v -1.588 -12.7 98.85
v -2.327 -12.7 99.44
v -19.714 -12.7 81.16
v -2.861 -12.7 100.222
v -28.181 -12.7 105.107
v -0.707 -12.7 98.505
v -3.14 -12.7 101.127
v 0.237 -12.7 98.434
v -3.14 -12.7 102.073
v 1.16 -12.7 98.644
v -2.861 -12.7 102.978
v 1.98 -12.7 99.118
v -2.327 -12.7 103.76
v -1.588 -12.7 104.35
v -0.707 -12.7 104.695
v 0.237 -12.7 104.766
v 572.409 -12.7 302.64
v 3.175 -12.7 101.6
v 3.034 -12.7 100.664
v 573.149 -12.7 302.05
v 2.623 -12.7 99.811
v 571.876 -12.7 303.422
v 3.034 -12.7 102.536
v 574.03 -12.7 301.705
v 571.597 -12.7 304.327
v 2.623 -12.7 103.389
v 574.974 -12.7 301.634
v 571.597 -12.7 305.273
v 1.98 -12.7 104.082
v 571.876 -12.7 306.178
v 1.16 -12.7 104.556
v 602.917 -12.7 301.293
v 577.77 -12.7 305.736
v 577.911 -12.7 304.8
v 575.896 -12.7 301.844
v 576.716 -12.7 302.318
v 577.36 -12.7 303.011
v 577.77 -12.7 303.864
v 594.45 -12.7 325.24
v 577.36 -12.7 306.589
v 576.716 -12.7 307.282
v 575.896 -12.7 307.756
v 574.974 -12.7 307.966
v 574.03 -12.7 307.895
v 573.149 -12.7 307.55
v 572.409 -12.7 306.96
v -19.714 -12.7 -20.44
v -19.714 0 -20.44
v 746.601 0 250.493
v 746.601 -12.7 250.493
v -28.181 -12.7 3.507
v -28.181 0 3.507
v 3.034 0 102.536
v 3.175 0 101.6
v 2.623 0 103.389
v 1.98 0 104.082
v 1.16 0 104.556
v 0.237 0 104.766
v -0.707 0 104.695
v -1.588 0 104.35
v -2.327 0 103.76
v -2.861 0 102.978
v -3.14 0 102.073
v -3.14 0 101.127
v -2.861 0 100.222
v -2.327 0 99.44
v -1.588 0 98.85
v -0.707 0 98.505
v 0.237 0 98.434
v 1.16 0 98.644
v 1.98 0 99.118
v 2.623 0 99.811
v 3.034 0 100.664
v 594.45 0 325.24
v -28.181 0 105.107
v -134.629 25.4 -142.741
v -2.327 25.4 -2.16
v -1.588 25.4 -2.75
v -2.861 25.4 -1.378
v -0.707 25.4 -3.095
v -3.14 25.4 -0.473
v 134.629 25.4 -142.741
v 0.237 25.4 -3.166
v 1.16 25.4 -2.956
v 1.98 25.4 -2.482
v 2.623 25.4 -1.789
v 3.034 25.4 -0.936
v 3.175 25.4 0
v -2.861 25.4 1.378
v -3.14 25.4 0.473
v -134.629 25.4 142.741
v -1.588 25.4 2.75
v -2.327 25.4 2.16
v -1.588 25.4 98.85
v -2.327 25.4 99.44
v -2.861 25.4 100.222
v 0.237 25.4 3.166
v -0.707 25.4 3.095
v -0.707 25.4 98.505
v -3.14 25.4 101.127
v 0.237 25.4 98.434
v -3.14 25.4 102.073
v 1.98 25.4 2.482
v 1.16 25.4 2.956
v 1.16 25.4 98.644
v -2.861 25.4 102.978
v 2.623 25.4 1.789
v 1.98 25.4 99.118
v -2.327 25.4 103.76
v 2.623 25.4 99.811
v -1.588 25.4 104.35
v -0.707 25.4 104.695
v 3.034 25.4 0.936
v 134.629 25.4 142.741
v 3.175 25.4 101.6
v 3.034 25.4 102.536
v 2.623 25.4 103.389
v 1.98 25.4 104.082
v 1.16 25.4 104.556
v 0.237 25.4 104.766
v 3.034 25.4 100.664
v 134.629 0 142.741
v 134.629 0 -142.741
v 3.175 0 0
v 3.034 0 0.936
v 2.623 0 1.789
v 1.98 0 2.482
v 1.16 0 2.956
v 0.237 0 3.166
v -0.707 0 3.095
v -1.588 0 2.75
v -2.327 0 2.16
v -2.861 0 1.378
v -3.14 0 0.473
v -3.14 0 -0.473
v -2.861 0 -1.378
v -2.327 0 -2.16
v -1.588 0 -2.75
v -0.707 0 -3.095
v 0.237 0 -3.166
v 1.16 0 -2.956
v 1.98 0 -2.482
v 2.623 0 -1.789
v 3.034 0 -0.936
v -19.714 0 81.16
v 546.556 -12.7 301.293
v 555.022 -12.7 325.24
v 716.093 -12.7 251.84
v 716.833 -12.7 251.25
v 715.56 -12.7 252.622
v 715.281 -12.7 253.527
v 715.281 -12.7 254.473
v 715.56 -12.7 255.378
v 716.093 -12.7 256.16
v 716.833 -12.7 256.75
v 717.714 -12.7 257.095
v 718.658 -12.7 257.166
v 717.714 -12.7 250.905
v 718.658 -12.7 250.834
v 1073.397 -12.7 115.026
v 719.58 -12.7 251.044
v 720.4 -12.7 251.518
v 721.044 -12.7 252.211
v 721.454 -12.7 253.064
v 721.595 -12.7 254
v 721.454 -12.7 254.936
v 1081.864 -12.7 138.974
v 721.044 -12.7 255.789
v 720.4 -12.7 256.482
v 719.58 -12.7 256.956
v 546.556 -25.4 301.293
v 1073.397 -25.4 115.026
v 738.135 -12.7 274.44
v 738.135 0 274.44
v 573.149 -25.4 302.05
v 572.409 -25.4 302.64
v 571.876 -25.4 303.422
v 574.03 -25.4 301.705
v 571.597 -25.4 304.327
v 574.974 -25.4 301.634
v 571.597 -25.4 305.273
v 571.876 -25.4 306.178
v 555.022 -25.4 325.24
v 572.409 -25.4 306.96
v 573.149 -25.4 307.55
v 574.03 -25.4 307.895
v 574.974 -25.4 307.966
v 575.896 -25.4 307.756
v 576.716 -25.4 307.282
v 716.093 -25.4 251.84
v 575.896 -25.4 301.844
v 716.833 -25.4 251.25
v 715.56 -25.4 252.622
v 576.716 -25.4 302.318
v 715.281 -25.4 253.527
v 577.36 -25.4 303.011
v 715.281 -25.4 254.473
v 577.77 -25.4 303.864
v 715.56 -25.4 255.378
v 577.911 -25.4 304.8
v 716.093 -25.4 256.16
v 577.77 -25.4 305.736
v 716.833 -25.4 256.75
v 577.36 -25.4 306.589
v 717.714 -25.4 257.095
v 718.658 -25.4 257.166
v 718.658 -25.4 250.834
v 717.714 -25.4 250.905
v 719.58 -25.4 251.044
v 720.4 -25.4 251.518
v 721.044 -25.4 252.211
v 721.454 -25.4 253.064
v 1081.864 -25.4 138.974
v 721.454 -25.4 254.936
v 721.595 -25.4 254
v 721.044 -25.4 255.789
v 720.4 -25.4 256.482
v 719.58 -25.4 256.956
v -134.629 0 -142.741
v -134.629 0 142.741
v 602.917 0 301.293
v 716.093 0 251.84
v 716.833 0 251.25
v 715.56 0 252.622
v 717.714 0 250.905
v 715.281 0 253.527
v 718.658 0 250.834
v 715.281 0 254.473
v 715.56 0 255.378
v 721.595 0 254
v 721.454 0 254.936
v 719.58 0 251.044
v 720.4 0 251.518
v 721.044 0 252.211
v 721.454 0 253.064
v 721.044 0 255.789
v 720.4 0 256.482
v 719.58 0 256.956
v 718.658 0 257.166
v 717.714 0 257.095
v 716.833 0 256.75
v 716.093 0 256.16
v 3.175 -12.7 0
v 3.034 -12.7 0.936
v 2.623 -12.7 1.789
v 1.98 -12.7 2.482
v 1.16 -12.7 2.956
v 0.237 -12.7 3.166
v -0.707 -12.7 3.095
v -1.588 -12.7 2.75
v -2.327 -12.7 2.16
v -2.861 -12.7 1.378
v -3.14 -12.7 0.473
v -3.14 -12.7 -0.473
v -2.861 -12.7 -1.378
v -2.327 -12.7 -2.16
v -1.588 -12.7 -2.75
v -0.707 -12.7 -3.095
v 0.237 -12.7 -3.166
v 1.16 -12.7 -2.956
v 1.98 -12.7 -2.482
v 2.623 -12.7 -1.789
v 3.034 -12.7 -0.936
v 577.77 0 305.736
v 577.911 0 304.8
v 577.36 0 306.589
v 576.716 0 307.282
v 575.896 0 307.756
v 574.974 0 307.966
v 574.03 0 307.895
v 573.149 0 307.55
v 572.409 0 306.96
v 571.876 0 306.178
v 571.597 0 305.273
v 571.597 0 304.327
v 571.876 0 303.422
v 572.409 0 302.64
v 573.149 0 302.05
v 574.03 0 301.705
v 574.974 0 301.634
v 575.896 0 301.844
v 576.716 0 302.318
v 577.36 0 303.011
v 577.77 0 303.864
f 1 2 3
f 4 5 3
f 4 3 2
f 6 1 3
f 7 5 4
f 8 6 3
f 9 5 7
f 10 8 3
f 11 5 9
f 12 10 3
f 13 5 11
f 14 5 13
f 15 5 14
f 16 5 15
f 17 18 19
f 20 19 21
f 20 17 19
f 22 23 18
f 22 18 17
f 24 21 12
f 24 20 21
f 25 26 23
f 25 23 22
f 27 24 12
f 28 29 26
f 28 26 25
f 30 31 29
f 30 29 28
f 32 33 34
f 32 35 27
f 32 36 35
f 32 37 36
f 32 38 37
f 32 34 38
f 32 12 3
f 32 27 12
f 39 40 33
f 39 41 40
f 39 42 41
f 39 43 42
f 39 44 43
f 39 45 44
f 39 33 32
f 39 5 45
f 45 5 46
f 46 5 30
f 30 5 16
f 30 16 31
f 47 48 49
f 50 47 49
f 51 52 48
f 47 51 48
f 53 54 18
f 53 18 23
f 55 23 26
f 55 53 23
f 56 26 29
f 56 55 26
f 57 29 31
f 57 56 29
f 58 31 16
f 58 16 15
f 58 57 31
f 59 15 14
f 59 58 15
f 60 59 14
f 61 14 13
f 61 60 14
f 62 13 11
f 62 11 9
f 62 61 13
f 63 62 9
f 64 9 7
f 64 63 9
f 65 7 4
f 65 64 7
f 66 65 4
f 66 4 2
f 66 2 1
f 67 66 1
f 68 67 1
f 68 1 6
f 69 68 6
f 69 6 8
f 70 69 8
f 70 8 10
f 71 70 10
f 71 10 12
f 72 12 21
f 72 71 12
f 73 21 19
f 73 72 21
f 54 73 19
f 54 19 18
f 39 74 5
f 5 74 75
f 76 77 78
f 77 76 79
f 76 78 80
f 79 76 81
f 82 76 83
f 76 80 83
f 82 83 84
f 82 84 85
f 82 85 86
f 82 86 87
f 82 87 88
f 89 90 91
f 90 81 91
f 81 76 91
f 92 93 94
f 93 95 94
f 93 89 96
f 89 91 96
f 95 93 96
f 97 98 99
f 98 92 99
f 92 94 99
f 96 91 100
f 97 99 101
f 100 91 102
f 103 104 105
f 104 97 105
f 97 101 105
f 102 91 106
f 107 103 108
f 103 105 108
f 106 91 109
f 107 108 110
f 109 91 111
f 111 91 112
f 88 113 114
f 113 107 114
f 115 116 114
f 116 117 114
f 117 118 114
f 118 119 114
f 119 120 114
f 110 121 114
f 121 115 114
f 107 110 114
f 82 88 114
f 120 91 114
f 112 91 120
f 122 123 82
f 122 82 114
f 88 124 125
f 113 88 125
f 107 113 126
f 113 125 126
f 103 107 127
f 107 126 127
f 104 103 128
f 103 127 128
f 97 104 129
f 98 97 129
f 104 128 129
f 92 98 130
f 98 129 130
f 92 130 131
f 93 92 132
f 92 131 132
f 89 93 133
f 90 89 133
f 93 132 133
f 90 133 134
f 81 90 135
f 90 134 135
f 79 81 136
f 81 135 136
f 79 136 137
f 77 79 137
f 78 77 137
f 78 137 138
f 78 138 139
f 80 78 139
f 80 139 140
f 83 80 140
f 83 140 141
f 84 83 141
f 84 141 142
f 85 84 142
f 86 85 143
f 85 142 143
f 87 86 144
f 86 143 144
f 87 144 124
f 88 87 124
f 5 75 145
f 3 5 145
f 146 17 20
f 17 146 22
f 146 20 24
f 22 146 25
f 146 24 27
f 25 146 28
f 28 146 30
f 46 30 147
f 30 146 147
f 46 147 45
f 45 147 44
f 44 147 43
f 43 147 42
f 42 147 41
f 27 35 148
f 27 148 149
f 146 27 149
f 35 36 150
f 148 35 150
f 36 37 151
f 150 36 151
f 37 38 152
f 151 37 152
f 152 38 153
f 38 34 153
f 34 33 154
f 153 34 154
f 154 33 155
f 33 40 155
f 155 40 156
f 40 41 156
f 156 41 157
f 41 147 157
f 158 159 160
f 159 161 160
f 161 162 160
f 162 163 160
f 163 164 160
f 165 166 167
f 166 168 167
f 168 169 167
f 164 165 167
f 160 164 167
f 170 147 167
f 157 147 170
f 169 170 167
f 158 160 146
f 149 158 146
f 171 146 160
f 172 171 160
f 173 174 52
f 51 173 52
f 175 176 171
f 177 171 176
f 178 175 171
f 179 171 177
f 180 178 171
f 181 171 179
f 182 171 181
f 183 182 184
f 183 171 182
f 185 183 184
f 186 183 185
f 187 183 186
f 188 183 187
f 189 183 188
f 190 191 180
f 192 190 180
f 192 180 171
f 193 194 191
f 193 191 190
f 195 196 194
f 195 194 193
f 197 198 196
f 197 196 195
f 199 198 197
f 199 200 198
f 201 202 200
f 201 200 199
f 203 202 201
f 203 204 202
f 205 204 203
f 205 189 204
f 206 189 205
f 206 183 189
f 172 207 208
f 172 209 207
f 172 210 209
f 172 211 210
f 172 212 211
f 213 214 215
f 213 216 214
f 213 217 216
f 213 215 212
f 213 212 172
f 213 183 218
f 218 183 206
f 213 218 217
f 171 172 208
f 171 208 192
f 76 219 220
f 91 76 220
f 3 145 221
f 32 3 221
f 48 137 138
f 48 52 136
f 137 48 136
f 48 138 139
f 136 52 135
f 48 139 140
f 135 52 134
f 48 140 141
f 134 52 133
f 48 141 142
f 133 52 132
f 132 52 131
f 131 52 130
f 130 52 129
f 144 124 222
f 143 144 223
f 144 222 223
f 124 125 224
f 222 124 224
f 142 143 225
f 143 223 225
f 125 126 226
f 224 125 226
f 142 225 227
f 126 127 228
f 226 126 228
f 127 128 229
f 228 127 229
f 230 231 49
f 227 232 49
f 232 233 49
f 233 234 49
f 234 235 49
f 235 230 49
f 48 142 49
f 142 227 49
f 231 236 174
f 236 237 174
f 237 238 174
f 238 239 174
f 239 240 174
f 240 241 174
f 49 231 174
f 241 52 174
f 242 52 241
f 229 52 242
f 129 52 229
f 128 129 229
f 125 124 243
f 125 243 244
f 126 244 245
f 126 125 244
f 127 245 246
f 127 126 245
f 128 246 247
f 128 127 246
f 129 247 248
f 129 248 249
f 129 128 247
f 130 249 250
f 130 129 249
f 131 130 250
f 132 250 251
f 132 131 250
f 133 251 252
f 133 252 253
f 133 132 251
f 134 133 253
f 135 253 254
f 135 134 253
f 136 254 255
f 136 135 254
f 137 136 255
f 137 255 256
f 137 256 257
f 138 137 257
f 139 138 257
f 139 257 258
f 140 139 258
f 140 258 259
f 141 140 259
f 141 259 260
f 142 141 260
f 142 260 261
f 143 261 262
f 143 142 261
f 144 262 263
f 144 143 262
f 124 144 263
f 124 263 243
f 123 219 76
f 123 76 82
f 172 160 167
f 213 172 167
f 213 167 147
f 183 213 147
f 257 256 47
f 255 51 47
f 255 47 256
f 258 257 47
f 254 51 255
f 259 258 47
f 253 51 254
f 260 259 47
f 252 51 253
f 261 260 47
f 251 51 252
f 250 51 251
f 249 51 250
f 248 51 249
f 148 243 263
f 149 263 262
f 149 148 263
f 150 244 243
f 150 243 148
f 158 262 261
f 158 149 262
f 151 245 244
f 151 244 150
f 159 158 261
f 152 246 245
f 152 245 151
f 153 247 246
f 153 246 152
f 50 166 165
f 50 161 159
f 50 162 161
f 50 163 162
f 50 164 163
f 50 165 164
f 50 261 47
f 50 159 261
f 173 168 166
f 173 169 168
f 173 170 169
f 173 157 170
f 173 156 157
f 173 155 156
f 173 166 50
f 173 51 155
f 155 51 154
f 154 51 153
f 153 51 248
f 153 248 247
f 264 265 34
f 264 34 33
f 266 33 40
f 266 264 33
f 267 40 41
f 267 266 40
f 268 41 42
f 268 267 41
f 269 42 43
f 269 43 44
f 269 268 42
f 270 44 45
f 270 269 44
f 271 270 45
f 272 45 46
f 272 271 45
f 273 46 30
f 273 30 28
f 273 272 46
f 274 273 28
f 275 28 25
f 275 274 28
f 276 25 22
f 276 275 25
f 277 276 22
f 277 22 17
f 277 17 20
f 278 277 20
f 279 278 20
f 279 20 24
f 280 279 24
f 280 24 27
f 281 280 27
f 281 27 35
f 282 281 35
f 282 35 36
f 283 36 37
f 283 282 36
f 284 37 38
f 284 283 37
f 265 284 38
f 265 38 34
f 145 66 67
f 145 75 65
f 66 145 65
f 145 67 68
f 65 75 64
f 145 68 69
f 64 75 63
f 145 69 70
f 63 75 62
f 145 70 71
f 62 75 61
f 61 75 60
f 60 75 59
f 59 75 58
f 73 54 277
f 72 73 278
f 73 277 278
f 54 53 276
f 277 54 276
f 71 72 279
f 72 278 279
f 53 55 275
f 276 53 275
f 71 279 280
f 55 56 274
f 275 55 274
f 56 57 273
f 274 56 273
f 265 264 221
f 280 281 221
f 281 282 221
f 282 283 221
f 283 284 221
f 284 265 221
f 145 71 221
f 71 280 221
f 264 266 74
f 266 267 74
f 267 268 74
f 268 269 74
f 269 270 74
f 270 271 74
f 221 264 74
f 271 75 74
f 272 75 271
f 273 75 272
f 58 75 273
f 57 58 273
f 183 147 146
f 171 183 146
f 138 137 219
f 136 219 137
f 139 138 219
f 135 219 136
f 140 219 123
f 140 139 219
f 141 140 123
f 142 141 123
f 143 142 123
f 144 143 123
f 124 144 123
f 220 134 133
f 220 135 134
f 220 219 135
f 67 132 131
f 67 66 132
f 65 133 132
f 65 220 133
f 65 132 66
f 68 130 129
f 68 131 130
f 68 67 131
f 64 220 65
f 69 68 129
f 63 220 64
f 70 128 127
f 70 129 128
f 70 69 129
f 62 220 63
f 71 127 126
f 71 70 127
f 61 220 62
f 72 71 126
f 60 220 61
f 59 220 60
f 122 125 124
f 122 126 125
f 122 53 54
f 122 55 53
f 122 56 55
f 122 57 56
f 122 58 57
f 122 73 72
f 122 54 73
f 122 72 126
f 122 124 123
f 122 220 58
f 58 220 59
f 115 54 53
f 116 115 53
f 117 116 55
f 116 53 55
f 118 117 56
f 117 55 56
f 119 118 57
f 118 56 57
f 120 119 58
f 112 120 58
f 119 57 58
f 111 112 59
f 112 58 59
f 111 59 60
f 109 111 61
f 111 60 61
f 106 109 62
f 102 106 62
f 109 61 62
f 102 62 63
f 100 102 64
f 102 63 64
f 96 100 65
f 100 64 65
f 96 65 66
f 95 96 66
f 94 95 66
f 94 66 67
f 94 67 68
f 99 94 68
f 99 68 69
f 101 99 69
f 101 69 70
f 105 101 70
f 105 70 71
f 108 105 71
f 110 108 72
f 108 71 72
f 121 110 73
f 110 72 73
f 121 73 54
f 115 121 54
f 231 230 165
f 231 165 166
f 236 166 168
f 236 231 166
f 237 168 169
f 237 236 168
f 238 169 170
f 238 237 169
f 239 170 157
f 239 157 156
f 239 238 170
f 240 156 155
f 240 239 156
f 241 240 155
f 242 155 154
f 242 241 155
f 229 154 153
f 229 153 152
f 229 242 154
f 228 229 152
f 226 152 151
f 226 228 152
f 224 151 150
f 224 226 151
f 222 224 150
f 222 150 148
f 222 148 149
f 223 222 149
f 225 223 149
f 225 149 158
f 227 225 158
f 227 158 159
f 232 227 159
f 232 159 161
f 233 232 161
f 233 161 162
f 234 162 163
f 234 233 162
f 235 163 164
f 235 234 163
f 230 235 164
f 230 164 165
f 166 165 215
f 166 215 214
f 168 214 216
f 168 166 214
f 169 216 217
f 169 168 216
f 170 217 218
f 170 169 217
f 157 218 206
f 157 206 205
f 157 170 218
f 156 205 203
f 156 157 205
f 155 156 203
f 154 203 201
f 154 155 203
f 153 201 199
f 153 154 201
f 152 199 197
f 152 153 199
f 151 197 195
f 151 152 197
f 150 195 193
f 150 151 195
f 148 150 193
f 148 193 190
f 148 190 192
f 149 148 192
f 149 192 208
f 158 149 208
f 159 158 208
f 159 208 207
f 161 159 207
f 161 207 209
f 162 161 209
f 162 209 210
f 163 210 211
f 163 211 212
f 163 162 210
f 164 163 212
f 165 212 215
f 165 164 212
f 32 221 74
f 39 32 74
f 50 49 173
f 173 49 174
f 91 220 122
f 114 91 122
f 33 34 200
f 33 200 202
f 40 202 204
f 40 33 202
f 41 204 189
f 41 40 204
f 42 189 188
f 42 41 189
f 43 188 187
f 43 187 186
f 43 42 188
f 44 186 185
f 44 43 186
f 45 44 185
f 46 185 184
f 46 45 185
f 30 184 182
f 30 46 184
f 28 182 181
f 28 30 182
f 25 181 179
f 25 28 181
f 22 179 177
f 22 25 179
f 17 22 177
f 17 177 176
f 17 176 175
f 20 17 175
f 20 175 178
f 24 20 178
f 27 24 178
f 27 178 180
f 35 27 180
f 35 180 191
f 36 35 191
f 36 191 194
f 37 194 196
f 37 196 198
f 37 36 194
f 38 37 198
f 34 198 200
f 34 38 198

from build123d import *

# Parameters (mm, degrees)
F1_R     = 3.175
F2_DEPTH = 12.7
F3_R     = 3.175
F4_DEPTH = 12.7
F5_W     = 269.25847
F5_H     = 285.48178
F5_R     = 3.175
F6_DEPTH = 25.4


with BuildPart() as f2:
    # F1 (on Front) → F2 (new body)
    with BuildSketch(Plane.XZ):
        Polygon((-28.180683, 105.107008), (-19.714016, 81.159659), (602.917075, 301.292992), (594.450408, 325.240341), align=None)
        with Locations((0, 101.6)):
            Circle(F1_R, mode=Mode.SUBTRACT)
        with Locations((574.736392, 304.8)):
            Circle(F1_R, mode=Mode.SUBTRACT)
        Polygon((-28.180683, 3.507008), (-19.714016, -20.440341), (746.601173, 250.492992), (738.134506, 274.440341), align=None)
        Circle(F1_R, mode=Mode.SUBTRACT)
        with Locations((718.42049, 254)):
            Circle(F1_R, mode=Mode.SUBTRACT)
    extrude(amount=F2_DEPTH)


with BuildPart() as f4:
    # F3 (on face) → F4 (new body)
    with BuildSketch(Plane.XZ.offset(12.7)):
        Polygon((1081.864068, 138.973675), (555.022375, 325.240341), (546.555709, 301.292992), (1073.397401, 115.026325), align=None)
        with Locations((718.42049, 254)):
            Circle(F3_R, mode=Mode.SUBTRACT)
        with Locations((574.736392, 304.8)):
            Circle(F3_R, mode=Mode.SUBTRACT)
    extrude(amount=F4_DEPTH)


with BuildPart() as f6:
    # F5 (on Front) → F6 (new body)
    with BuildSketch(Plane.XZ):
        Rectangle(F5_W, F5_H)
        Circle(F5_R, mode=Mode.SUBTRACT)
        with Locations((0, 101.6)):
            Circle(F5_R, mode=Mode.SUBTRACT)
    extrude(amount=-F6_DEPTH)


solid = Compound([f2.part, f4.part, f6.part])
